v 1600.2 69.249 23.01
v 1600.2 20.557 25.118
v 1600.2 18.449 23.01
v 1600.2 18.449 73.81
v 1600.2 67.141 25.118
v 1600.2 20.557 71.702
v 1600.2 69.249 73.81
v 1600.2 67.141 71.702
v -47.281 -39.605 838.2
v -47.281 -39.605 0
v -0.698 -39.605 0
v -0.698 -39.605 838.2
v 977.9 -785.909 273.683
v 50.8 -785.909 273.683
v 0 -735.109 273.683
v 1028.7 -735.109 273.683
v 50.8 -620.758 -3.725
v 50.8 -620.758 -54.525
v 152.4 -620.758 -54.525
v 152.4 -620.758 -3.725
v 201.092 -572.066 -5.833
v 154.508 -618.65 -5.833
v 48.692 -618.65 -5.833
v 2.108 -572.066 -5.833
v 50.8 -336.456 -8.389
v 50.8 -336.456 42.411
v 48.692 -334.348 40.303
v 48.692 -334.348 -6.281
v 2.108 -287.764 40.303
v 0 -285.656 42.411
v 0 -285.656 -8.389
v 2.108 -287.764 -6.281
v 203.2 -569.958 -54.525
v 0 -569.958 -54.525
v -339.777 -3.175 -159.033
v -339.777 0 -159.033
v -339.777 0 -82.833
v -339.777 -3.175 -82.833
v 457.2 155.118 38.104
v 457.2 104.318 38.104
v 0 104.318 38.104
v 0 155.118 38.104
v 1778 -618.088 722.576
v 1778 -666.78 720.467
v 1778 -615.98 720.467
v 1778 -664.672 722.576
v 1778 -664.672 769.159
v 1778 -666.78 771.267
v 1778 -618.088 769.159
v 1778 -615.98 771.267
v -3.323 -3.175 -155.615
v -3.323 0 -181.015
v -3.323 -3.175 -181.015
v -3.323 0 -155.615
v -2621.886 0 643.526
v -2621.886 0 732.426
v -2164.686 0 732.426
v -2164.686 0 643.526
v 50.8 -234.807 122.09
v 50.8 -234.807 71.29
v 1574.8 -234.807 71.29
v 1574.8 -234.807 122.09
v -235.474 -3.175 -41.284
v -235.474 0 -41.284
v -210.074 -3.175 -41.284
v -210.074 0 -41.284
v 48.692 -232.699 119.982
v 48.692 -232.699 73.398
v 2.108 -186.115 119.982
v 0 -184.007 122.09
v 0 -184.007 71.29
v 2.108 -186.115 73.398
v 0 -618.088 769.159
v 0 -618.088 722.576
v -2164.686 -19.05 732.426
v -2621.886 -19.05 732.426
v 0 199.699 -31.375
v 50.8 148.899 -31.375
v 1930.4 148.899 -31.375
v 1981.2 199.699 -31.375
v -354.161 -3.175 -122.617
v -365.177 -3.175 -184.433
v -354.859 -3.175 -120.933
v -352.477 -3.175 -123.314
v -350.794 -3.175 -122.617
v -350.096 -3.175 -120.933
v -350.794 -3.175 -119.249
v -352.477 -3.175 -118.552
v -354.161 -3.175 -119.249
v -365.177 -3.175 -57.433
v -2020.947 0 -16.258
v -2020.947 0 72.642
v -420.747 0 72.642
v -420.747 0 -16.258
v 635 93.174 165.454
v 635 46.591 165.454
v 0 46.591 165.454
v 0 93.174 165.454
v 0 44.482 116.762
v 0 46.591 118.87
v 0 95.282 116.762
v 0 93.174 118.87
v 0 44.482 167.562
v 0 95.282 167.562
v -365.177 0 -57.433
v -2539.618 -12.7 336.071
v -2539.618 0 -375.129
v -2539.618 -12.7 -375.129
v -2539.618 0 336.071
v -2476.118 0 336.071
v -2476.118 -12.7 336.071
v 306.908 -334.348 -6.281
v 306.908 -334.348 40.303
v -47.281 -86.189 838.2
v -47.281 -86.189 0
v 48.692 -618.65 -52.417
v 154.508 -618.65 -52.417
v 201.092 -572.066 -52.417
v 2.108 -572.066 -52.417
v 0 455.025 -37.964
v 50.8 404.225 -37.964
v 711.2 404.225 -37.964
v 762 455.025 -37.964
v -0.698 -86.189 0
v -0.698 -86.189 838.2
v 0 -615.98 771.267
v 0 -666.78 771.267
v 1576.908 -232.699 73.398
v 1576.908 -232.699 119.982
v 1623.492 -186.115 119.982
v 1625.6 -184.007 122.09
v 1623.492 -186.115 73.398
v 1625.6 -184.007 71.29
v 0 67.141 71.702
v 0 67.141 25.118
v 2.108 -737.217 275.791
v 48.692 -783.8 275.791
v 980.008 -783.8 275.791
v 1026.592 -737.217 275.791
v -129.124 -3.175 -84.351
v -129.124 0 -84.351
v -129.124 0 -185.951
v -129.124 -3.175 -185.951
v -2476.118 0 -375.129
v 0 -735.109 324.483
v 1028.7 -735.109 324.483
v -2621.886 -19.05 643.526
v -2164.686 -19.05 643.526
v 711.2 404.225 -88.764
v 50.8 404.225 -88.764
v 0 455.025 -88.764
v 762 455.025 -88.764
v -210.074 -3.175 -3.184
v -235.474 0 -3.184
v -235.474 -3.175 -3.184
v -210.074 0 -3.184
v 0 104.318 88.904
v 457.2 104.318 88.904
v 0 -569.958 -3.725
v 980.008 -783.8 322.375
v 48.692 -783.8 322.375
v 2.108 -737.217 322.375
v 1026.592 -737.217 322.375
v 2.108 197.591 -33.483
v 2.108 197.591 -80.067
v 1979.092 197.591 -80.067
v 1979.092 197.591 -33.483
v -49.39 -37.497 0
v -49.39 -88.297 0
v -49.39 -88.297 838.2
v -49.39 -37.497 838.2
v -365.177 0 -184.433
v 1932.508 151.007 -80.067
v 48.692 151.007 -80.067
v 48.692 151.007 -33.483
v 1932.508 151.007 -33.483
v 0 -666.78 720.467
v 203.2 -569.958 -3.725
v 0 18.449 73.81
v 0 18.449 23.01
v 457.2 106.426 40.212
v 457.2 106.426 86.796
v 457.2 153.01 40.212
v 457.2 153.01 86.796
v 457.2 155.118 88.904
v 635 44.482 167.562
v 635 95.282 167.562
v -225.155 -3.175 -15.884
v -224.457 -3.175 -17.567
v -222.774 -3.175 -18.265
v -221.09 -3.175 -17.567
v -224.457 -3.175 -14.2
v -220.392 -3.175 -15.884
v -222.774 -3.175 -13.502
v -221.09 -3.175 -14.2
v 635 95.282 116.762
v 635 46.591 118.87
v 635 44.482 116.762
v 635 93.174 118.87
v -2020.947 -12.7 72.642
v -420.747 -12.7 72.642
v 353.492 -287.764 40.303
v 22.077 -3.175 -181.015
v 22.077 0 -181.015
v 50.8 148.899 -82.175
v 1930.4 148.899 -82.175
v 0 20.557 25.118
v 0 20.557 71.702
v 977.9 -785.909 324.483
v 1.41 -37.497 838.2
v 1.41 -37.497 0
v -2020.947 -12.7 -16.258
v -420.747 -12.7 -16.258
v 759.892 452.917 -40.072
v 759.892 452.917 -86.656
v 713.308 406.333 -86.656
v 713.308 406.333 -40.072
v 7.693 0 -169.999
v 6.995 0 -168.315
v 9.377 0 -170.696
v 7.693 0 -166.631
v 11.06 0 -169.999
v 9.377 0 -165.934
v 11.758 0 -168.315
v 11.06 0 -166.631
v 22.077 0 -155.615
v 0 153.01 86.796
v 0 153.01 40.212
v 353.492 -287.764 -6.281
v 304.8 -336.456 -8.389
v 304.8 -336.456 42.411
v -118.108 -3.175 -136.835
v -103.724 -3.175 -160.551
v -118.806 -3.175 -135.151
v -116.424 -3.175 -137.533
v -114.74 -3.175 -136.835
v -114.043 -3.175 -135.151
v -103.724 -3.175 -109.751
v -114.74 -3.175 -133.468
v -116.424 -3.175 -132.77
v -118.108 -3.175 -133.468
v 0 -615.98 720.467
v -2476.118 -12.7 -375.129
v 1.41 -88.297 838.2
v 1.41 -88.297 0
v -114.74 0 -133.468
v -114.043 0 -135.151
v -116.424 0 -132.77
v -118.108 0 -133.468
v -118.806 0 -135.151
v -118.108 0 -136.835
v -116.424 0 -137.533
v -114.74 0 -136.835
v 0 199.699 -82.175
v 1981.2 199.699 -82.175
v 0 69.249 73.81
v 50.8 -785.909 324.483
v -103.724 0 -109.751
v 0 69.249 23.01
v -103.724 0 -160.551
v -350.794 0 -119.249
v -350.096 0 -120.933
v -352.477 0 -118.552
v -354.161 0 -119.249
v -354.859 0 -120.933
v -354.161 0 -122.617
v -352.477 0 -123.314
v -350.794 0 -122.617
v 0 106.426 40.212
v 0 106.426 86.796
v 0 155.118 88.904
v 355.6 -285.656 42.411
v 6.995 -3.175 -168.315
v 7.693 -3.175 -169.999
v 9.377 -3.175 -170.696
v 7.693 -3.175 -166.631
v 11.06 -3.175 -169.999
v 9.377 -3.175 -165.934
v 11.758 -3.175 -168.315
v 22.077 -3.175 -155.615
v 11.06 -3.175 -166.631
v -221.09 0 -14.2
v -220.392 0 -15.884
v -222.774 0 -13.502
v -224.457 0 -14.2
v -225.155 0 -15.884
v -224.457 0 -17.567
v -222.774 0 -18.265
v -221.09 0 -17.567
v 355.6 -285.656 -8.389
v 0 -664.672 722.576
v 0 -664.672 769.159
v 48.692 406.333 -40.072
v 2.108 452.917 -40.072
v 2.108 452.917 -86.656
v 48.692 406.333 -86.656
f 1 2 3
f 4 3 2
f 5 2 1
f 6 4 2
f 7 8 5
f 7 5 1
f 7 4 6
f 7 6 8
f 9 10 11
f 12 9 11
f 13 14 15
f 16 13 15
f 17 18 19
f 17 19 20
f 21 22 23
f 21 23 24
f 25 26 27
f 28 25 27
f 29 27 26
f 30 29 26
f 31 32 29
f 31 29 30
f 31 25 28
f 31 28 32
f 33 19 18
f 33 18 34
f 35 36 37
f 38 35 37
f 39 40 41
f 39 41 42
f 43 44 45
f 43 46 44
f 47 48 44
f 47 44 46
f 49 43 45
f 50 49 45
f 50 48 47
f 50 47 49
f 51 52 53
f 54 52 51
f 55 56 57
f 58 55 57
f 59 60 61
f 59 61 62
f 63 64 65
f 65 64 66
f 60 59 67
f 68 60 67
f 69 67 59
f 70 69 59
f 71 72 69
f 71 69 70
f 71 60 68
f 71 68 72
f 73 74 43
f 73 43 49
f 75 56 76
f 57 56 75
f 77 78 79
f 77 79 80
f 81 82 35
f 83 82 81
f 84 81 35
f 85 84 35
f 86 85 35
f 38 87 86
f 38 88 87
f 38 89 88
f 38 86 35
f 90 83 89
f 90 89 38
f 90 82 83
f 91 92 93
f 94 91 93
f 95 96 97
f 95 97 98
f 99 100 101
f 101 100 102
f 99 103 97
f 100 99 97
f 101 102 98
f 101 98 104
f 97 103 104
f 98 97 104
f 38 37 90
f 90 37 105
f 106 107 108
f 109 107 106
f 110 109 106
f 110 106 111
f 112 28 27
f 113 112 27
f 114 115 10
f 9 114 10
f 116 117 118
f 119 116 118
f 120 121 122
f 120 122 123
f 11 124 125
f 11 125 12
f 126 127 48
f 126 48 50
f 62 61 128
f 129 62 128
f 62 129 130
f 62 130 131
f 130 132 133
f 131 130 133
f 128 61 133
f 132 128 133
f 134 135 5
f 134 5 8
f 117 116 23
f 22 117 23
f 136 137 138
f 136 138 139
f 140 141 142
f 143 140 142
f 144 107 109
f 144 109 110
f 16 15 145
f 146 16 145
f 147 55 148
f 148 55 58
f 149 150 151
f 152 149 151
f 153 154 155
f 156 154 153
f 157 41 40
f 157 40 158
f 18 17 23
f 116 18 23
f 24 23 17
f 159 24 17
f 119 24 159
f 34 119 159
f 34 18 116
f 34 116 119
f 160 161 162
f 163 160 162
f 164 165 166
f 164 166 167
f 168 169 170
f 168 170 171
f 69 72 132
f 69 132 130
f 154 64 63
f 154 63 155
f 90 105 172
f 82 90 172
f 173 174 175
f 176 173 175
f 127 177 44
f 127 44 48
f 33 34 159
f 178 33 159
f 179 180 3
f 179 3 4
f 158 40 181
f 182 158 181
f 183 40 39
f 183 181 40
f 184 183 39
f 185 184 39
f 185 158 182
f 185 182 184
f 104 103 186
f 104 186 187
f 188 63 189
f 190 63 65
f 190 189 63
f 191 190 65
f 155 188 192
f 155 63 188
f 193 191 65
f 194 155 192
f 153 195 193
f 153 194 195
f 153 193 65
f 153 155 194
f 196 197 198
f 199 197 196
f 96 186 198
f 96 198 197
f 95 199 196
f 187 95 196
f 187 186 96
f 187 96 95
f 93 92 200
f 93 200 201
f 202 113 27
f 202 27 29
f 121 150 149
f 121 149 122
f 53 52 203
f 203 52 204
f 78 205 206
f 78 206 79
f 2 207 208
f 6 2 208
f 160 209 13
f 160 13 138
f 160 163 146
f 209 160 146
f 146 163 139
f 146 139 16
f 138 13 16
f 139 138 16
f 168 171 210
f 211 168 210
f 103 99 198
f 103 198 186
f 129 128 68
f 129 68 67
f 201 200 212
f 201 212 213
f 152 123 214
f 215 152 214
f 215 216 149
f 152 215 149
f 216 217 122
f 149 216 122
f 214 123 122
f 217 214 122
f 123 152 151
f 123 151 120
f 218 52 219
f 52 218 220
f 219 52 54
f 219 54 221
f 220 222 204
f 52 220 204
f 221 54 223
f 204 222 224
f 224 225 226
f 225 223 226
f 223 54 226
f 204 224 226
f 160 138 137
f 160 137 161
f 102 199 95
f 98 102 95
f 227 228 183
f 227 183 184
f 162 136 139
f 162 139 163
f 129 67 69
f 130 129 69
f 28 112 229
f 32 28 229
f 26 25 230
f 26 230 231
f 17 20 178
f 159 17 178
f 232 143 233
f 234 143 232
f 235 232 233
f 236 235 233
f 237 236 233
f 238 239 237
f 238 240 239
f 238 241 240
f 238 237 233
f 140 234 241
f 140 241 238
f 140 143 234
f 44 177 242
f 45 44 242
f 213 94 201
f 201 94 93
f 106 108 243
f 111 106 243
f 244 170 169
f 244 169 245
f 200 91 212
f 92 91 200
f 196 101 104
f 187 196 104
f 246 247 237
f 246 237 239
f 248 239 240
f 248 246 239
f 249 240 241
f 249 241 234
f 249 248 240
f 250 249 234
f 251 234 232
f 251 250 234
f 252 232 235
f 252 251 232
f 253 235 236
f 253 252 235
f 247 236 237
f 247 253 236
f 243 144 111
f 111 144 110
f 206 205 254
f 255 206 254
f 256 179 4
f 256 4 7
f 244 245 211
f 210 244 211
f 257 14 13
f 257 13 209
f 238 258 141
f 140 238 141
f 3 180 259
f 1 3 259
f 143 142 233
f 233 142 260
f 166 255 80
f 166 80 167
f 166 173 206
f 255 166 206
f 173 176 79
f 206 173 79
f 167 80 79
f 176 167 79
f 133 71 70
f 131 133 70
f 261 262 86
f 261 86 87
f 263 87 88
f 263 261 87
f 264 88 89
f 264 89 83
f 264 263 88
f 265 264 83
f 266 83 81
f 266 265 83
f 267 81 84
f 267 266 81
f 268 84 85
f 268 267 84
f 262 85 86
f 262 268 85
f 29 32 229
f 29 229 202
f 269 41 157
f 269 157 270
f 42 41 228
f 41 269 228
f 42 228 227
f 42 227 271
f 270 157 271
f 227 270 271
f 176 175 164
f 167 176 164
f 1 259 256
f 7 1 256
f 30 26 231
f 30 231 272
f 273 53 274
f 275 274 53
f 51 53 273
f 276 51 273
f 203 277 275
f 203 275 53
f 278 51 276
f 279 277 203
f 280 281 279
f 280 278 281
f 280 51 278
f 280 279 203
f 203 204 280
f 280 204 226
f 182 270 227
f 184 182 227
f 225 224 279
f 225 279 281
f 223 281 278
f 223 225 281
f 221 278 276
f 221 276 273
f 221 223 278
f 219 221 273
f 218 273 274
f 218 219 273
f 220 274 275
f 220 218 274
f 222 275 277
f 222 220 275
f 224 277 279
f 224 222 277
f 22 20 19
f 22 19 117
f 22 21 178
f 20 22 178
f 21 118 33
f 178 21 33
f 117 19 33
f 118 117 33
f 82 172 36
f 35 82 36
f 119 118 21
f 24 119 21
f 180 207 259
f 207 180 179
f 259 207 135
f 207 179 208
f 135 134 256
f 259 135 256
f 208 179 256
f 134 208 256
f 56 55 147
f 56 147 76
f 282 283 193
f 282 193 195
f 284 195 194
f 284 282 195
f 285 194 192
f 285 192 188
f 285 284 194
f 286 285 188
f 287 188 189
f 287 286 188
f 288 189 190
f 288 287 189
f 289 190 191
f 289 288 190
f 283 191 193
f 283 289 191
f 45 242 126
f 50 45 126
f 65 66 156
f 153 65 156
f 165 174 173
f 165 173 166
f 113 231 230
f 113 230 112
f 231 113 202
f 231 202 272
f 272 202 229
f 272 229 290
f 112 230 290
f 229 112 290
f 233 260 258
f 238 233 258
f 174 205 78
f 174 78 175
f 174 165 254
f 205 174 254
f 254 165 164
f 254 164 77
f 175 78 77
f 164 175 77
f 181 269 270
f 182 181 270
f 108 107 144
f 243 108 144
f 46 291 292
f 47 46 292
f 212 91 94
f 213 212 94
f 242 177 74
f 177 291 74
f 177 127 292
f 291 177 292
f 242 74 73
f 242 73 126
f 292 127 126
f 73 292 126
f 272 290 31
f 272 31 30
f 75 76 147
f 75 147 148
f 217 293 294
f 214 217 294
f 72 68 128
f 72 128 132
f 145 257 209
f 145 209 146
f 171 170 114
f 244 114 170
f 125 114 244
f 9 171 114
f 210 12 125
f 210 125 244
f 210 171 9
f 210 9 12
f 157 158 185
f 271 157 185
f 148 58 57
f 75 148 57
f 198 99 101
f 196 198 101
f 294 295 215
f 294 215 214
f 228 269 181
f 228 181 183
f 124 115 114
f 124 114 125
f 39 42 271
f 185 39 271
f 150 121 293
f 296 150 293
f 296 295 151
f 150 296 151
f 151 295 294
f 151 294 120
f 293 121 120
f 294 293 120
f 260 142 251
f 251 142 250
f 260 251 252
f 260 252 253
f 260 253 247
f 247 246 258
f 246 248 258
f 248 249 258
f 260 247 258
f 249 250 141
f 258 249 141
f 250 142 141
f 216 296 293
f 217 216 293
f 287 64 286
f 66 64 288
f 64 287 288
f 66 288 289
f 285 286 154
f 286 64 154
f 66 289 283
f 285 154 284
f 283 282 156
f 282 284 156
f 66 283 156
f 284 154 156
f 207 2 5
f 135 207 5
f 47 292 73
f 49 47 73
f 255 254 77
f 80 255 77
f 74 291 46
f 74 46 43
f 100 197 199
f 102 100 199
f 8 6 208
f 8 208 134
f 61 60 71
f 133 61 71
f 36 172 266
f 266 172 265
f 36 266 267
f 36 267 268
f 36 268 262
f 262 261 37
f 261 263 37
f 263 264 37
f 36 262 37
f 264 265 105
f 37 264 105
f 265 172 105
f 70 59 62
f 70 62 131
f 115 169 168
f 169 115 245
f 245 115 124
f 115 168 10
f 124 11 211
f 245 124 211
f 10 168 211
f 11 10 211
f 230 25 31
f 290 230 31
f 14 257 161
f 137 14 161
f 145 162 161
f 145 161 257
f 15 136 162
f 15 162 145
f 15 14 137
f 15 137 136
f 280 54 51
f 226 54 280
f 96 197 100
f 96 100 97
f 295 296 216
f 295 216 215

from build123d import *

# Parameters (mm, degrees)
F0_W         = 50.8
F0_H         = 50.8
F0_W_2       = 46.5836
F0_H_2       = 46.5836
F1_DEPTH     = 838.2
F2_W         = 50.8
F2_H         = 50.8
F2_W_2       = 46.5836
F2_H_2       = 46.5836
F3_DEPTH     = 1600.2
F4_W         = 50.8
F4_H         = 50.8
F4_W_2       = 46.5836
F4_H_2       = 46.5836
F5_DEPTH     = 457.2
F6_W         = 50.8
F6_H         = 50.8
F6_W_2       = 46.5836
F6_H_2       = 46.5836
F7_DEPTH     = 1981.2
F9_DEPTH     = 50.8
F10_W        = 50.8
F10_H        = 50.8
F10_W_2      = 46.5836
F10_H_2      = 46.5836
F11_DEPTH    = 762
F13_DEPTH    = 50.8
F14_R        = 2.38125
F15_DEPTH    = 3.175
F16_W        = 25.4
F16_H        = 25.4
F16_R        = 2.38125
F17_DEPTH    = 3.175
F18_W        = 1600.2
F18_H        = 88.9
F19_DEPTH    = 12.7
F20_W        = 63.5
F20_H        = 711.2
F21_DEPTH    = 12.7
F22_W        = 50.8
F22_H        = 50.8
F22_W_2      = 46.5836
F22_H_2      = 46.5836
F23_DEPTH    = 355.6
F24_T1_DEPTH = 312.0829915773
F25_W        = 50.8
F25_H        = 50.8
F25_W_2      = 46.5836
F25_H_2      = 46.5836
F26_DEPTH    = 1625.6
F27_T1_DEPTH = 312.0829915773
F28_W        = 50.8
F28_H        = 50.8
F28_W_2      = 46.5836
F28_H_2      = 46.5836
F29_DEPTH    = 203.2
F30_T1_DEPTH = 312.0829915773
F31_R        = 2.38125
F32_DEPTH    = 3.175
F33_W        = 25.4
F33_H        = 38.1
F33_R        = 2.38125
F34_DEPTH    = 3.175
F35_W        = 457.2
F35_H        = 88.9
F36_DEPTH    = 19.05
F37_W        = 50.8
F37_H        = 50.8
F37_W_2      = 46.5836
F37_H_2      = 46.5836
F38_DEPTH    = 1028.7
F39_T1_DEPTH = 312.0829915773
F40_W        = 50.8
F40_H        = 50.8
F40_W_2      = 46.5836
F40_H_2      = 46.5836
F41_DEPTH    = 635
F42_W        = 50.8
F42_H        = 50.8
F42_W_2      = 46.5836
F42_H_2      = 46.5836
F43_DEPTH    = 1778


# Not quite as in the source:
# - a fillet or chamfer that OpenCascade refuses, or shapes differently, is made with other operations: its cross-section is extruded or revolved along the edge and cut away or added


with BuildPart() as f1:
    # F0 (on Top) → F1 (new body)
    with BuildSketch(Plane.XY):
        with Locations((-23.9895193481, -62.8970144058)):
            Rectangle(F0_W, F0_H)
        with Locations((-23.9895193481, -62.8970144058)):
            Rectangle(F0_W_2, F0_H_2, mode=Mode.SUBTRACT)
    extrude(amount=F1_DEPTH)


with BuildPart() as f3:
    # F2 (on Right) → F3 (new body)
    with BuildSketch(Plane.YZ):
        with Locations((43.8489612991, 48.4097724301)):
            Rectangle(F2_W, F2_H)
        with Locations((43.8489612991, 48.4097724301)):
            Rectangle(F2_W_2, F2_H_2, mode=Mode.SUBTRACT)
    extrude(amount=F3_DEPTH)


with BuildPart() as f5:
    # F4 (on Right) → F5 (new body)
    with BuildSketch(Plane.YZ):
        with Locations((129.718255794, 63.5042605758)):
            Rectangle(F4_W, F4_H)
        with Locations((129.718255794, 63.5042605758)):
            Rectangle(F4_W_2, F4_H_2, mode=Mode.SUBTRACT)
    extrude(amount=F5_DEPTH)


with BuildPart() as f7:
    # F6 (on Right) → F7 (new body)
    with BuildSketch(Plane.YZ):
        with Locations((174.2987973452, -56.7749696016)):
            Rectangle(F6_W, F6_H)
        with Locations((174.2987973452, -56.7749696016)):
            Rectangle(F6_W_2, F6_H_2, mode=Mode.SUBTRACT)
    extrude(amount=F7_DEPTH)

    # F8 (on face) → F9 (cut, through all)
    with BuildSketch(Plane.XY.offset(-31.3749696016)):
        Polygon((1981.2, 148.8987973452), (1981.2, 199.6987973452), (1930.4, 148.8987973452), align=None)
        Polygon((50.8, 148.8987973452), (0, 199.6987973452), (0, 148.8987973452), align=None)
    extrude(amount=-F9_DEPTH, mode=Mode.SUBTRACT)


with BuildPart() as f11:
    # F10 (on Right) → F11 (new body)
    with BuildSketch(Plane.YZ):
        with Locations((429.6248448849, -63.3640619159)):
            Rectangle(F10_W, F10_H)
        with Locations((429.6248448849, -63.3640619159)):
            Rectangle(F10_W_2, F10_H_2, mode=Mode.SUBTRACT)
    extrude(amount=F11_DEPTH)

    # F12 (on face) → F13 (cut, through all)
    with BuildSketch(Plane.XY.offset(-37.9640619159)):
        Polygon((50.8, 404.2248448849), (0, 455.0248448849), (0, 404.2248448849), align=None)
        Polygon((762, 404.2248448849), (762, 455.0248448849), (711.2, 404.2248448849), align=None)
    extrude(amount=-F13_DEPTH, mode=Mode.SUBTRACT)


with BuildPart() as f15:
    # F14 (on Front) → F15 (new body)
    with BuildSketch(Plane.XZ):
        Polygon((-103.7242509466, -109.7514086127), (-129.1242509466, -84.3514086127), (-129.1242509466, -185.9514086127), (-103.7242509466, -160.5514086127), align=None)
        with Locations((-116.4242509466, -135.1514086127)):
            Circle(F14_R, mode=Mode.SUBTRACT)
    extrude(amount=F15_DEPTH)


with BuildPart() as f17:
    # F16 (on Front) → F17 (new body)
    with BuildSketch(Plane.XZ):
        with Locations((9.3765241186, -168.3152318001)):
            Rectangle(F16_W, F16_H)
        with Locations((9.3765241186, -168.3152318001)):
            Circle(F16_R, mode=Mode.SUBTRACT)
    extrude(amount=F17_DEPTH)


with BuildPart() as f19:
    # F18 (on Front) → F19 (new body)
    with BuildSketch(Plane.XZ):
        with Locations((-1220.8474673271, 28.1916467965)):
            Rectangle(F18_W, F18_H)
    extrude(amount=F19_DEPTH)


with BuildPart() as f21:
    # F20 (on Front) → F21 (new body)
    with BuildSketch(Plane.XZ):
        with Locations((-2507.8683080673, -19.528626181)):
            Rectangle(F20_W, F20_H)
    extrude(amount=F21_DEPTH)


with BuildPart() as f23:
    # F22 (on Right) → F23 (new body)
    with BuildSketch(Plane.YZ):
        with Locations((-311.0560774803, 17.0110743493)):
            Rectangle(F22_W, F22_H)
        with Locations((-311.0560774803, 17.0110743493)):
            Rectangle(F22_W_2, F22_H_2, mode=Mode.SUBTRACT)
    extrude(amount=F23_DEPTH)

    # F24: chamfer of 50.8 on 2 edges, made by hand

    # F24_s2 → F24_t1 (cut)
    with BuildSketch(Plane.XY.offset(-139.0304214394)):
        Polygon((304.8, -336.4560774803), (355.6, -285.6560774803), (355.6, -336.4560774803), align=None)
        Polygon((50.8, -336.4560774803), (0, -285.6560774803), (0, -336.4560774803), align=None)
    extrude(amount=F24_T1_DEPTH, mode=Mode.SUBTRACT)


with BuildPart() as f26:
    # F25 (on Right) → F26 (new body)
    with BuildSketch(Plane.YZ):
        with Locations((-209.4067037106, 96.6901108623)):
            Rectangle(F25_W, F25_H)
        with Locations((-209.4067037106, 96.6901108623)):
            Rectangle(F25_W_2, F25_H_2, mode=Mode.SUBTRACT)
    extrude(amount=F26_DEPTH)

    # F27: chamfer of 50.8 on 2 edges, made by hand

    # F27_s2 → F27_t1 (cut)
    with BuildSketch(Plane.XY.offset(-59.3513849264)):
        Polygon((50.8, -234.8067037106), (0, -184.0067037106), (0, -234.8067037106), align=None)
        Polygon((1574.8, -234.8067037106), (1625.6, -184.0067037106), (1625.6, -234.8067037106), align=None)
    extrude(amount=F27_T1_DEPTH, mode=Mode.SUBTRACT)


with BuildPart() as f29:
    # F28 (on Right) → F29 (new body)
    with BuildSketch(Plane.YZ):
        with Locations((-595.3577756882, -29.1252676398)):
            Rectangle(F28_W, F28_H)
        with Locations((-595.3577756882, -29.1252676398)):
            Rectangle(F28_W_2, F28_H_2, mode=Mode.SUBTRACT)
    extrude(amount=F29_DEPTH)

    # F30: chamfer of 50.8 on 2 edges, made by hand

    # F30_s2 → F30_t1 (cut)
    with BuildSketch(Plane.XY.offset(-185.1667634284)):
        Polygon((152.4, -620.7577756882), (203.2, -569.9577756882), (203.2, -620.7577756882), align=None)
        Polygon((50.8, -620.7577756882), (0, -569.9577756882), (0, -620.7577756882), align=None)
    extrude(amount=F30_T1_DEPTH, mode=Mode.SUBTRACT)


with BuildPart() as f32:
    # F31 (on Front) → F32 (new body)
    with BuildSketch(Plane.XZ):
        Polygon((-339.7773418903, -82.8328536272), (-365.1773418903, -57.4328536272), (-365.1773418903, -184.4328536272), (-339.7773418903, -159.0328536272), align=None)
        with Locations((-352.4773418903, -120.9328536272)):
            Circle(F31_R, mode=Mode.SUBTRACT)
    extrude(amount=F32_DEPTH)


with BuildPart() as f34:
    # F33 (on Front) → F34 (new body)
    with BuildSketch(Plane.XZ):
        with Locations((-222.7736711502, -22.2336029798)):
            Rectangle(F33_W, F33_H)
        with Locations((-222.7736711502, -15.8836029798)):
            Circle(F33_R, mode=Mode.SUBTRACT)
    extrude(amount=F34_DEPTH)


with BuildPart() as f36:
    # F35 (on Front) → F36 (new body)
    with BuildSketch(Plane.XZ):
        with Locations((-2393.2858118057, 687.9762411118)):
            Rectangle(F35_W, F35_H)
    extrude(amount=F36_DEPTH)


with BuildPart() as f38:
    # F37 (on Right) → F38 (new body)
    with BuildSketch(Plane.YZ):
        with Locations((-760.5085968971, 299.0830242634)):
            Rectangle(F37_W, F37_H)
        with Locations((-760.5085968971, 299.0830242634)):
            Rectangle(F37_W_2, F37_H_2, mode=Mode.SUBTRACT)
    extrude(amount=F38_DEPTH)

    # F39: chamfer of 50.8 on 2 edges, made by hand

    # F39_s2 → F39_t1 (cut)
    with BuildSketch(Plane.XY.offset(143.0415284747)):
        Polygon((977.9, -785.9085968971), (1028.7, -735.1085968971), (1028.7, -785.9085968971), align=None)
        Polygon((50.8, -785.9085968971), (0, -735.1085968971), (0, -785.9085968971), align=None)
    extrude(amount=F39_T1_DEPTH, mode=Mode.SUBTRACT)


with BuildPart() as f41:
    # F40 (on Right) → F41 (new body)
    with BuildSketch(Plane.YZ):
        with Locations((69.8824599385, 142.1617567539)):
            Rectangle(F40_W, F40_H)
        with Locations((69.8824599385, 142.1617567539)):
            Rectangle(F40_W_2, F40_H_2, mode=Mode.SUBTRACT)
    extrude(amount=F41_DEPTH)


with BuildPart() as f43:
    # F42 (on Right) → F43 (new body)
    with BuildSketch(Plane.YZ):
        with Locations((-641.3798928261, 745.8674311638)):
            Rectangle(F42_W, F42_H)
        with Locations((-641.3798928261, 745.8674311638)):
            Rectangle(F42_W_2, F42_H_2, mode=Mode.SUBTRACT)
    extrude(amount=F43_DEPTH)


solid = Compound([f1.part, f3.part, f5.part, f7.part, f11.part, f15.part, f17.part, f19.part, f21.part, f23.part, f26.part, f29.part, f32.part, f34.part, f36.part, f38.part, f41.part, f43.part])
